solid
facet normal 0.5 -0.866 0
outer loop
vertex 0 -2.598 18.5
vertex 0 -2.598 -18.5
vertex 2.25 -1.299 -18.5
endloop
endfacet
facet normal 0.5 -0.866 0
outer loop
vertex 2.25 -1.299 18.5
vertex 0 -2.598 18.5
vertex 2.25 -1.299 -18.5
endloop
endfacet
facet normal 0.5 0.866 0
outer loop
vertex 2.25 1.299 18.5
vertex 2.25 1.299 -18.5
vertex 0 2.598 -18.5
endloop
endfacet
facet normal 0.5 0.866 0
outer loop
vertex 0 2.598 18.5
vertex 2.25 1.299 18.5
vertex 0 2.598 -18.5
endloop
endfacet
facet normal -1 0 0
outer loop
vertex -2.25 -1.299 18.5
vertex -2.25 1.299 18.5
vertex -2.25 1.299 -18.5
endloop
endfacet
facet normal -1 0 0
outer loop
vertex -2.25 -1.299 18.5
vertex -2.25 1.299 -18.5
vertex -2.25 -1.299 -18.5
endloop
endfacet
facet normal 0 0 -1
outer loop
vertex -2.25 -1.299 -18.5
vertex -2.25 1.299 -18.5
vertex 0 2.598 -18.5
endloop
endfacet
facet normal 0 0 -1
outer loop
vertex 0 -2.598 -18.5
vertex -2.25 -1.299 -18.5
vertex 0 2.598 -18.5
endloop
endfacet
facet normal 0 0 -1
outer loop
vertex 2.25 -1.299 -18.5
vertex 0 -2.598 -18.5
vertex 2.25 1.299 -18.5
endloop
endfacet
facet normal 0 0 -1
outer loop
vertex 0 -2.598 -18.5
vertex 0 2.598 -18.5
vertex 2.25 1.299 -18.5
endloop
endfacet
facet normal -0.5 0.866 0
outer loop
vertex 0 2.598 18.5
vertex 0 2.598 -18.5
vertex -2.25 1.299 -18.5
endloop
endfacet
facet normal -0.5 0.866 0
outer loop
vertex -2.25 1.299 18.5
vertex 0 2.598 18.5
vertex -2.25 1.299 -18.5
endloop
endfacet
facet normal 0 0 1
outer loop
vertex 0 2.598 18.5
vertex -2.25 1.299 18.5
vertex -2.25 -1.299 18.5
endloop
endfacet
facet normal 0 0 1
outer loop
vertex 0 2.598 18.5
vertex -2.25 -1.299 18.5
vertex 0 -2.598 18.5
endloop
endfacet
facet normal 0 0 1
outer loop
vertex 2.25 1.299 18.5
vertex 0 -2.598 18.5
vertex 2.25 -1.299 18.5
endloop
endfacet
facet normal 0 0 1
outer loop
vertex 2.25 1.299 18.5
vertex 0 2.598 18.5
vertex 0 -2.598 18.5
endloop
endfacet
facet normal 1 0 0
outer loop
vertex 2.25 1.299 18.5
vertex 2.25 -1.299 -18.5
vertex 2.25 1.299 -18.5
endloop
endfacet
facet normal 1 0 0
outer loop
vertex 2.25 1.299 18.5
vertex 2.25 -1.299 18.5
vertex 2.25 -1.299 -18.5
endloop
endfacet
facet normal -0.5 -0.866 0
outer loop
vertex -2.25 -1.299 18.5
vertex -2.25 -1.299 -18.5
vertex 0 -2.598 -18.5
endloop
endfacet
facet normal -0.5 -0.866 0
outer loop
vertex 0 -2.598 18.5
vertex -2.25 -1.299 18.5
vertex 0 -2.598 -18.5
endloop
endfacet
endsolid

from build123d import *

# Parameters (mm, degrees)
SKETCH1_R           = 1.5
EXTRUDE1_DEPTH      = 18.5
EXTRUDE1_DEPTH_BACK = 18.5


with BuildPart() as part:
    # Sketch1 → Extrude1 (new, two sides)
    with BuildSketch(Plane.XY) as extrude1_sk:
        Polygon((2.25, -1.299038106), (2.25, 1.299038106), (0, 2.598076211), (-2.25, 1.299038106), (-2.25, -1.299038106), (0, -2.598076211), align=None)
        Circle(SKETCH1_R, mode=Mode.SUBTRACT)
        Circle(SKETCH1_R)
    extrude(amount=EXTRUDE1_DEPTH)
    extrude(extrude1_sk.sketch, amount=-EXTRUDE1_DEPTH_BACK)


solid = part.part
